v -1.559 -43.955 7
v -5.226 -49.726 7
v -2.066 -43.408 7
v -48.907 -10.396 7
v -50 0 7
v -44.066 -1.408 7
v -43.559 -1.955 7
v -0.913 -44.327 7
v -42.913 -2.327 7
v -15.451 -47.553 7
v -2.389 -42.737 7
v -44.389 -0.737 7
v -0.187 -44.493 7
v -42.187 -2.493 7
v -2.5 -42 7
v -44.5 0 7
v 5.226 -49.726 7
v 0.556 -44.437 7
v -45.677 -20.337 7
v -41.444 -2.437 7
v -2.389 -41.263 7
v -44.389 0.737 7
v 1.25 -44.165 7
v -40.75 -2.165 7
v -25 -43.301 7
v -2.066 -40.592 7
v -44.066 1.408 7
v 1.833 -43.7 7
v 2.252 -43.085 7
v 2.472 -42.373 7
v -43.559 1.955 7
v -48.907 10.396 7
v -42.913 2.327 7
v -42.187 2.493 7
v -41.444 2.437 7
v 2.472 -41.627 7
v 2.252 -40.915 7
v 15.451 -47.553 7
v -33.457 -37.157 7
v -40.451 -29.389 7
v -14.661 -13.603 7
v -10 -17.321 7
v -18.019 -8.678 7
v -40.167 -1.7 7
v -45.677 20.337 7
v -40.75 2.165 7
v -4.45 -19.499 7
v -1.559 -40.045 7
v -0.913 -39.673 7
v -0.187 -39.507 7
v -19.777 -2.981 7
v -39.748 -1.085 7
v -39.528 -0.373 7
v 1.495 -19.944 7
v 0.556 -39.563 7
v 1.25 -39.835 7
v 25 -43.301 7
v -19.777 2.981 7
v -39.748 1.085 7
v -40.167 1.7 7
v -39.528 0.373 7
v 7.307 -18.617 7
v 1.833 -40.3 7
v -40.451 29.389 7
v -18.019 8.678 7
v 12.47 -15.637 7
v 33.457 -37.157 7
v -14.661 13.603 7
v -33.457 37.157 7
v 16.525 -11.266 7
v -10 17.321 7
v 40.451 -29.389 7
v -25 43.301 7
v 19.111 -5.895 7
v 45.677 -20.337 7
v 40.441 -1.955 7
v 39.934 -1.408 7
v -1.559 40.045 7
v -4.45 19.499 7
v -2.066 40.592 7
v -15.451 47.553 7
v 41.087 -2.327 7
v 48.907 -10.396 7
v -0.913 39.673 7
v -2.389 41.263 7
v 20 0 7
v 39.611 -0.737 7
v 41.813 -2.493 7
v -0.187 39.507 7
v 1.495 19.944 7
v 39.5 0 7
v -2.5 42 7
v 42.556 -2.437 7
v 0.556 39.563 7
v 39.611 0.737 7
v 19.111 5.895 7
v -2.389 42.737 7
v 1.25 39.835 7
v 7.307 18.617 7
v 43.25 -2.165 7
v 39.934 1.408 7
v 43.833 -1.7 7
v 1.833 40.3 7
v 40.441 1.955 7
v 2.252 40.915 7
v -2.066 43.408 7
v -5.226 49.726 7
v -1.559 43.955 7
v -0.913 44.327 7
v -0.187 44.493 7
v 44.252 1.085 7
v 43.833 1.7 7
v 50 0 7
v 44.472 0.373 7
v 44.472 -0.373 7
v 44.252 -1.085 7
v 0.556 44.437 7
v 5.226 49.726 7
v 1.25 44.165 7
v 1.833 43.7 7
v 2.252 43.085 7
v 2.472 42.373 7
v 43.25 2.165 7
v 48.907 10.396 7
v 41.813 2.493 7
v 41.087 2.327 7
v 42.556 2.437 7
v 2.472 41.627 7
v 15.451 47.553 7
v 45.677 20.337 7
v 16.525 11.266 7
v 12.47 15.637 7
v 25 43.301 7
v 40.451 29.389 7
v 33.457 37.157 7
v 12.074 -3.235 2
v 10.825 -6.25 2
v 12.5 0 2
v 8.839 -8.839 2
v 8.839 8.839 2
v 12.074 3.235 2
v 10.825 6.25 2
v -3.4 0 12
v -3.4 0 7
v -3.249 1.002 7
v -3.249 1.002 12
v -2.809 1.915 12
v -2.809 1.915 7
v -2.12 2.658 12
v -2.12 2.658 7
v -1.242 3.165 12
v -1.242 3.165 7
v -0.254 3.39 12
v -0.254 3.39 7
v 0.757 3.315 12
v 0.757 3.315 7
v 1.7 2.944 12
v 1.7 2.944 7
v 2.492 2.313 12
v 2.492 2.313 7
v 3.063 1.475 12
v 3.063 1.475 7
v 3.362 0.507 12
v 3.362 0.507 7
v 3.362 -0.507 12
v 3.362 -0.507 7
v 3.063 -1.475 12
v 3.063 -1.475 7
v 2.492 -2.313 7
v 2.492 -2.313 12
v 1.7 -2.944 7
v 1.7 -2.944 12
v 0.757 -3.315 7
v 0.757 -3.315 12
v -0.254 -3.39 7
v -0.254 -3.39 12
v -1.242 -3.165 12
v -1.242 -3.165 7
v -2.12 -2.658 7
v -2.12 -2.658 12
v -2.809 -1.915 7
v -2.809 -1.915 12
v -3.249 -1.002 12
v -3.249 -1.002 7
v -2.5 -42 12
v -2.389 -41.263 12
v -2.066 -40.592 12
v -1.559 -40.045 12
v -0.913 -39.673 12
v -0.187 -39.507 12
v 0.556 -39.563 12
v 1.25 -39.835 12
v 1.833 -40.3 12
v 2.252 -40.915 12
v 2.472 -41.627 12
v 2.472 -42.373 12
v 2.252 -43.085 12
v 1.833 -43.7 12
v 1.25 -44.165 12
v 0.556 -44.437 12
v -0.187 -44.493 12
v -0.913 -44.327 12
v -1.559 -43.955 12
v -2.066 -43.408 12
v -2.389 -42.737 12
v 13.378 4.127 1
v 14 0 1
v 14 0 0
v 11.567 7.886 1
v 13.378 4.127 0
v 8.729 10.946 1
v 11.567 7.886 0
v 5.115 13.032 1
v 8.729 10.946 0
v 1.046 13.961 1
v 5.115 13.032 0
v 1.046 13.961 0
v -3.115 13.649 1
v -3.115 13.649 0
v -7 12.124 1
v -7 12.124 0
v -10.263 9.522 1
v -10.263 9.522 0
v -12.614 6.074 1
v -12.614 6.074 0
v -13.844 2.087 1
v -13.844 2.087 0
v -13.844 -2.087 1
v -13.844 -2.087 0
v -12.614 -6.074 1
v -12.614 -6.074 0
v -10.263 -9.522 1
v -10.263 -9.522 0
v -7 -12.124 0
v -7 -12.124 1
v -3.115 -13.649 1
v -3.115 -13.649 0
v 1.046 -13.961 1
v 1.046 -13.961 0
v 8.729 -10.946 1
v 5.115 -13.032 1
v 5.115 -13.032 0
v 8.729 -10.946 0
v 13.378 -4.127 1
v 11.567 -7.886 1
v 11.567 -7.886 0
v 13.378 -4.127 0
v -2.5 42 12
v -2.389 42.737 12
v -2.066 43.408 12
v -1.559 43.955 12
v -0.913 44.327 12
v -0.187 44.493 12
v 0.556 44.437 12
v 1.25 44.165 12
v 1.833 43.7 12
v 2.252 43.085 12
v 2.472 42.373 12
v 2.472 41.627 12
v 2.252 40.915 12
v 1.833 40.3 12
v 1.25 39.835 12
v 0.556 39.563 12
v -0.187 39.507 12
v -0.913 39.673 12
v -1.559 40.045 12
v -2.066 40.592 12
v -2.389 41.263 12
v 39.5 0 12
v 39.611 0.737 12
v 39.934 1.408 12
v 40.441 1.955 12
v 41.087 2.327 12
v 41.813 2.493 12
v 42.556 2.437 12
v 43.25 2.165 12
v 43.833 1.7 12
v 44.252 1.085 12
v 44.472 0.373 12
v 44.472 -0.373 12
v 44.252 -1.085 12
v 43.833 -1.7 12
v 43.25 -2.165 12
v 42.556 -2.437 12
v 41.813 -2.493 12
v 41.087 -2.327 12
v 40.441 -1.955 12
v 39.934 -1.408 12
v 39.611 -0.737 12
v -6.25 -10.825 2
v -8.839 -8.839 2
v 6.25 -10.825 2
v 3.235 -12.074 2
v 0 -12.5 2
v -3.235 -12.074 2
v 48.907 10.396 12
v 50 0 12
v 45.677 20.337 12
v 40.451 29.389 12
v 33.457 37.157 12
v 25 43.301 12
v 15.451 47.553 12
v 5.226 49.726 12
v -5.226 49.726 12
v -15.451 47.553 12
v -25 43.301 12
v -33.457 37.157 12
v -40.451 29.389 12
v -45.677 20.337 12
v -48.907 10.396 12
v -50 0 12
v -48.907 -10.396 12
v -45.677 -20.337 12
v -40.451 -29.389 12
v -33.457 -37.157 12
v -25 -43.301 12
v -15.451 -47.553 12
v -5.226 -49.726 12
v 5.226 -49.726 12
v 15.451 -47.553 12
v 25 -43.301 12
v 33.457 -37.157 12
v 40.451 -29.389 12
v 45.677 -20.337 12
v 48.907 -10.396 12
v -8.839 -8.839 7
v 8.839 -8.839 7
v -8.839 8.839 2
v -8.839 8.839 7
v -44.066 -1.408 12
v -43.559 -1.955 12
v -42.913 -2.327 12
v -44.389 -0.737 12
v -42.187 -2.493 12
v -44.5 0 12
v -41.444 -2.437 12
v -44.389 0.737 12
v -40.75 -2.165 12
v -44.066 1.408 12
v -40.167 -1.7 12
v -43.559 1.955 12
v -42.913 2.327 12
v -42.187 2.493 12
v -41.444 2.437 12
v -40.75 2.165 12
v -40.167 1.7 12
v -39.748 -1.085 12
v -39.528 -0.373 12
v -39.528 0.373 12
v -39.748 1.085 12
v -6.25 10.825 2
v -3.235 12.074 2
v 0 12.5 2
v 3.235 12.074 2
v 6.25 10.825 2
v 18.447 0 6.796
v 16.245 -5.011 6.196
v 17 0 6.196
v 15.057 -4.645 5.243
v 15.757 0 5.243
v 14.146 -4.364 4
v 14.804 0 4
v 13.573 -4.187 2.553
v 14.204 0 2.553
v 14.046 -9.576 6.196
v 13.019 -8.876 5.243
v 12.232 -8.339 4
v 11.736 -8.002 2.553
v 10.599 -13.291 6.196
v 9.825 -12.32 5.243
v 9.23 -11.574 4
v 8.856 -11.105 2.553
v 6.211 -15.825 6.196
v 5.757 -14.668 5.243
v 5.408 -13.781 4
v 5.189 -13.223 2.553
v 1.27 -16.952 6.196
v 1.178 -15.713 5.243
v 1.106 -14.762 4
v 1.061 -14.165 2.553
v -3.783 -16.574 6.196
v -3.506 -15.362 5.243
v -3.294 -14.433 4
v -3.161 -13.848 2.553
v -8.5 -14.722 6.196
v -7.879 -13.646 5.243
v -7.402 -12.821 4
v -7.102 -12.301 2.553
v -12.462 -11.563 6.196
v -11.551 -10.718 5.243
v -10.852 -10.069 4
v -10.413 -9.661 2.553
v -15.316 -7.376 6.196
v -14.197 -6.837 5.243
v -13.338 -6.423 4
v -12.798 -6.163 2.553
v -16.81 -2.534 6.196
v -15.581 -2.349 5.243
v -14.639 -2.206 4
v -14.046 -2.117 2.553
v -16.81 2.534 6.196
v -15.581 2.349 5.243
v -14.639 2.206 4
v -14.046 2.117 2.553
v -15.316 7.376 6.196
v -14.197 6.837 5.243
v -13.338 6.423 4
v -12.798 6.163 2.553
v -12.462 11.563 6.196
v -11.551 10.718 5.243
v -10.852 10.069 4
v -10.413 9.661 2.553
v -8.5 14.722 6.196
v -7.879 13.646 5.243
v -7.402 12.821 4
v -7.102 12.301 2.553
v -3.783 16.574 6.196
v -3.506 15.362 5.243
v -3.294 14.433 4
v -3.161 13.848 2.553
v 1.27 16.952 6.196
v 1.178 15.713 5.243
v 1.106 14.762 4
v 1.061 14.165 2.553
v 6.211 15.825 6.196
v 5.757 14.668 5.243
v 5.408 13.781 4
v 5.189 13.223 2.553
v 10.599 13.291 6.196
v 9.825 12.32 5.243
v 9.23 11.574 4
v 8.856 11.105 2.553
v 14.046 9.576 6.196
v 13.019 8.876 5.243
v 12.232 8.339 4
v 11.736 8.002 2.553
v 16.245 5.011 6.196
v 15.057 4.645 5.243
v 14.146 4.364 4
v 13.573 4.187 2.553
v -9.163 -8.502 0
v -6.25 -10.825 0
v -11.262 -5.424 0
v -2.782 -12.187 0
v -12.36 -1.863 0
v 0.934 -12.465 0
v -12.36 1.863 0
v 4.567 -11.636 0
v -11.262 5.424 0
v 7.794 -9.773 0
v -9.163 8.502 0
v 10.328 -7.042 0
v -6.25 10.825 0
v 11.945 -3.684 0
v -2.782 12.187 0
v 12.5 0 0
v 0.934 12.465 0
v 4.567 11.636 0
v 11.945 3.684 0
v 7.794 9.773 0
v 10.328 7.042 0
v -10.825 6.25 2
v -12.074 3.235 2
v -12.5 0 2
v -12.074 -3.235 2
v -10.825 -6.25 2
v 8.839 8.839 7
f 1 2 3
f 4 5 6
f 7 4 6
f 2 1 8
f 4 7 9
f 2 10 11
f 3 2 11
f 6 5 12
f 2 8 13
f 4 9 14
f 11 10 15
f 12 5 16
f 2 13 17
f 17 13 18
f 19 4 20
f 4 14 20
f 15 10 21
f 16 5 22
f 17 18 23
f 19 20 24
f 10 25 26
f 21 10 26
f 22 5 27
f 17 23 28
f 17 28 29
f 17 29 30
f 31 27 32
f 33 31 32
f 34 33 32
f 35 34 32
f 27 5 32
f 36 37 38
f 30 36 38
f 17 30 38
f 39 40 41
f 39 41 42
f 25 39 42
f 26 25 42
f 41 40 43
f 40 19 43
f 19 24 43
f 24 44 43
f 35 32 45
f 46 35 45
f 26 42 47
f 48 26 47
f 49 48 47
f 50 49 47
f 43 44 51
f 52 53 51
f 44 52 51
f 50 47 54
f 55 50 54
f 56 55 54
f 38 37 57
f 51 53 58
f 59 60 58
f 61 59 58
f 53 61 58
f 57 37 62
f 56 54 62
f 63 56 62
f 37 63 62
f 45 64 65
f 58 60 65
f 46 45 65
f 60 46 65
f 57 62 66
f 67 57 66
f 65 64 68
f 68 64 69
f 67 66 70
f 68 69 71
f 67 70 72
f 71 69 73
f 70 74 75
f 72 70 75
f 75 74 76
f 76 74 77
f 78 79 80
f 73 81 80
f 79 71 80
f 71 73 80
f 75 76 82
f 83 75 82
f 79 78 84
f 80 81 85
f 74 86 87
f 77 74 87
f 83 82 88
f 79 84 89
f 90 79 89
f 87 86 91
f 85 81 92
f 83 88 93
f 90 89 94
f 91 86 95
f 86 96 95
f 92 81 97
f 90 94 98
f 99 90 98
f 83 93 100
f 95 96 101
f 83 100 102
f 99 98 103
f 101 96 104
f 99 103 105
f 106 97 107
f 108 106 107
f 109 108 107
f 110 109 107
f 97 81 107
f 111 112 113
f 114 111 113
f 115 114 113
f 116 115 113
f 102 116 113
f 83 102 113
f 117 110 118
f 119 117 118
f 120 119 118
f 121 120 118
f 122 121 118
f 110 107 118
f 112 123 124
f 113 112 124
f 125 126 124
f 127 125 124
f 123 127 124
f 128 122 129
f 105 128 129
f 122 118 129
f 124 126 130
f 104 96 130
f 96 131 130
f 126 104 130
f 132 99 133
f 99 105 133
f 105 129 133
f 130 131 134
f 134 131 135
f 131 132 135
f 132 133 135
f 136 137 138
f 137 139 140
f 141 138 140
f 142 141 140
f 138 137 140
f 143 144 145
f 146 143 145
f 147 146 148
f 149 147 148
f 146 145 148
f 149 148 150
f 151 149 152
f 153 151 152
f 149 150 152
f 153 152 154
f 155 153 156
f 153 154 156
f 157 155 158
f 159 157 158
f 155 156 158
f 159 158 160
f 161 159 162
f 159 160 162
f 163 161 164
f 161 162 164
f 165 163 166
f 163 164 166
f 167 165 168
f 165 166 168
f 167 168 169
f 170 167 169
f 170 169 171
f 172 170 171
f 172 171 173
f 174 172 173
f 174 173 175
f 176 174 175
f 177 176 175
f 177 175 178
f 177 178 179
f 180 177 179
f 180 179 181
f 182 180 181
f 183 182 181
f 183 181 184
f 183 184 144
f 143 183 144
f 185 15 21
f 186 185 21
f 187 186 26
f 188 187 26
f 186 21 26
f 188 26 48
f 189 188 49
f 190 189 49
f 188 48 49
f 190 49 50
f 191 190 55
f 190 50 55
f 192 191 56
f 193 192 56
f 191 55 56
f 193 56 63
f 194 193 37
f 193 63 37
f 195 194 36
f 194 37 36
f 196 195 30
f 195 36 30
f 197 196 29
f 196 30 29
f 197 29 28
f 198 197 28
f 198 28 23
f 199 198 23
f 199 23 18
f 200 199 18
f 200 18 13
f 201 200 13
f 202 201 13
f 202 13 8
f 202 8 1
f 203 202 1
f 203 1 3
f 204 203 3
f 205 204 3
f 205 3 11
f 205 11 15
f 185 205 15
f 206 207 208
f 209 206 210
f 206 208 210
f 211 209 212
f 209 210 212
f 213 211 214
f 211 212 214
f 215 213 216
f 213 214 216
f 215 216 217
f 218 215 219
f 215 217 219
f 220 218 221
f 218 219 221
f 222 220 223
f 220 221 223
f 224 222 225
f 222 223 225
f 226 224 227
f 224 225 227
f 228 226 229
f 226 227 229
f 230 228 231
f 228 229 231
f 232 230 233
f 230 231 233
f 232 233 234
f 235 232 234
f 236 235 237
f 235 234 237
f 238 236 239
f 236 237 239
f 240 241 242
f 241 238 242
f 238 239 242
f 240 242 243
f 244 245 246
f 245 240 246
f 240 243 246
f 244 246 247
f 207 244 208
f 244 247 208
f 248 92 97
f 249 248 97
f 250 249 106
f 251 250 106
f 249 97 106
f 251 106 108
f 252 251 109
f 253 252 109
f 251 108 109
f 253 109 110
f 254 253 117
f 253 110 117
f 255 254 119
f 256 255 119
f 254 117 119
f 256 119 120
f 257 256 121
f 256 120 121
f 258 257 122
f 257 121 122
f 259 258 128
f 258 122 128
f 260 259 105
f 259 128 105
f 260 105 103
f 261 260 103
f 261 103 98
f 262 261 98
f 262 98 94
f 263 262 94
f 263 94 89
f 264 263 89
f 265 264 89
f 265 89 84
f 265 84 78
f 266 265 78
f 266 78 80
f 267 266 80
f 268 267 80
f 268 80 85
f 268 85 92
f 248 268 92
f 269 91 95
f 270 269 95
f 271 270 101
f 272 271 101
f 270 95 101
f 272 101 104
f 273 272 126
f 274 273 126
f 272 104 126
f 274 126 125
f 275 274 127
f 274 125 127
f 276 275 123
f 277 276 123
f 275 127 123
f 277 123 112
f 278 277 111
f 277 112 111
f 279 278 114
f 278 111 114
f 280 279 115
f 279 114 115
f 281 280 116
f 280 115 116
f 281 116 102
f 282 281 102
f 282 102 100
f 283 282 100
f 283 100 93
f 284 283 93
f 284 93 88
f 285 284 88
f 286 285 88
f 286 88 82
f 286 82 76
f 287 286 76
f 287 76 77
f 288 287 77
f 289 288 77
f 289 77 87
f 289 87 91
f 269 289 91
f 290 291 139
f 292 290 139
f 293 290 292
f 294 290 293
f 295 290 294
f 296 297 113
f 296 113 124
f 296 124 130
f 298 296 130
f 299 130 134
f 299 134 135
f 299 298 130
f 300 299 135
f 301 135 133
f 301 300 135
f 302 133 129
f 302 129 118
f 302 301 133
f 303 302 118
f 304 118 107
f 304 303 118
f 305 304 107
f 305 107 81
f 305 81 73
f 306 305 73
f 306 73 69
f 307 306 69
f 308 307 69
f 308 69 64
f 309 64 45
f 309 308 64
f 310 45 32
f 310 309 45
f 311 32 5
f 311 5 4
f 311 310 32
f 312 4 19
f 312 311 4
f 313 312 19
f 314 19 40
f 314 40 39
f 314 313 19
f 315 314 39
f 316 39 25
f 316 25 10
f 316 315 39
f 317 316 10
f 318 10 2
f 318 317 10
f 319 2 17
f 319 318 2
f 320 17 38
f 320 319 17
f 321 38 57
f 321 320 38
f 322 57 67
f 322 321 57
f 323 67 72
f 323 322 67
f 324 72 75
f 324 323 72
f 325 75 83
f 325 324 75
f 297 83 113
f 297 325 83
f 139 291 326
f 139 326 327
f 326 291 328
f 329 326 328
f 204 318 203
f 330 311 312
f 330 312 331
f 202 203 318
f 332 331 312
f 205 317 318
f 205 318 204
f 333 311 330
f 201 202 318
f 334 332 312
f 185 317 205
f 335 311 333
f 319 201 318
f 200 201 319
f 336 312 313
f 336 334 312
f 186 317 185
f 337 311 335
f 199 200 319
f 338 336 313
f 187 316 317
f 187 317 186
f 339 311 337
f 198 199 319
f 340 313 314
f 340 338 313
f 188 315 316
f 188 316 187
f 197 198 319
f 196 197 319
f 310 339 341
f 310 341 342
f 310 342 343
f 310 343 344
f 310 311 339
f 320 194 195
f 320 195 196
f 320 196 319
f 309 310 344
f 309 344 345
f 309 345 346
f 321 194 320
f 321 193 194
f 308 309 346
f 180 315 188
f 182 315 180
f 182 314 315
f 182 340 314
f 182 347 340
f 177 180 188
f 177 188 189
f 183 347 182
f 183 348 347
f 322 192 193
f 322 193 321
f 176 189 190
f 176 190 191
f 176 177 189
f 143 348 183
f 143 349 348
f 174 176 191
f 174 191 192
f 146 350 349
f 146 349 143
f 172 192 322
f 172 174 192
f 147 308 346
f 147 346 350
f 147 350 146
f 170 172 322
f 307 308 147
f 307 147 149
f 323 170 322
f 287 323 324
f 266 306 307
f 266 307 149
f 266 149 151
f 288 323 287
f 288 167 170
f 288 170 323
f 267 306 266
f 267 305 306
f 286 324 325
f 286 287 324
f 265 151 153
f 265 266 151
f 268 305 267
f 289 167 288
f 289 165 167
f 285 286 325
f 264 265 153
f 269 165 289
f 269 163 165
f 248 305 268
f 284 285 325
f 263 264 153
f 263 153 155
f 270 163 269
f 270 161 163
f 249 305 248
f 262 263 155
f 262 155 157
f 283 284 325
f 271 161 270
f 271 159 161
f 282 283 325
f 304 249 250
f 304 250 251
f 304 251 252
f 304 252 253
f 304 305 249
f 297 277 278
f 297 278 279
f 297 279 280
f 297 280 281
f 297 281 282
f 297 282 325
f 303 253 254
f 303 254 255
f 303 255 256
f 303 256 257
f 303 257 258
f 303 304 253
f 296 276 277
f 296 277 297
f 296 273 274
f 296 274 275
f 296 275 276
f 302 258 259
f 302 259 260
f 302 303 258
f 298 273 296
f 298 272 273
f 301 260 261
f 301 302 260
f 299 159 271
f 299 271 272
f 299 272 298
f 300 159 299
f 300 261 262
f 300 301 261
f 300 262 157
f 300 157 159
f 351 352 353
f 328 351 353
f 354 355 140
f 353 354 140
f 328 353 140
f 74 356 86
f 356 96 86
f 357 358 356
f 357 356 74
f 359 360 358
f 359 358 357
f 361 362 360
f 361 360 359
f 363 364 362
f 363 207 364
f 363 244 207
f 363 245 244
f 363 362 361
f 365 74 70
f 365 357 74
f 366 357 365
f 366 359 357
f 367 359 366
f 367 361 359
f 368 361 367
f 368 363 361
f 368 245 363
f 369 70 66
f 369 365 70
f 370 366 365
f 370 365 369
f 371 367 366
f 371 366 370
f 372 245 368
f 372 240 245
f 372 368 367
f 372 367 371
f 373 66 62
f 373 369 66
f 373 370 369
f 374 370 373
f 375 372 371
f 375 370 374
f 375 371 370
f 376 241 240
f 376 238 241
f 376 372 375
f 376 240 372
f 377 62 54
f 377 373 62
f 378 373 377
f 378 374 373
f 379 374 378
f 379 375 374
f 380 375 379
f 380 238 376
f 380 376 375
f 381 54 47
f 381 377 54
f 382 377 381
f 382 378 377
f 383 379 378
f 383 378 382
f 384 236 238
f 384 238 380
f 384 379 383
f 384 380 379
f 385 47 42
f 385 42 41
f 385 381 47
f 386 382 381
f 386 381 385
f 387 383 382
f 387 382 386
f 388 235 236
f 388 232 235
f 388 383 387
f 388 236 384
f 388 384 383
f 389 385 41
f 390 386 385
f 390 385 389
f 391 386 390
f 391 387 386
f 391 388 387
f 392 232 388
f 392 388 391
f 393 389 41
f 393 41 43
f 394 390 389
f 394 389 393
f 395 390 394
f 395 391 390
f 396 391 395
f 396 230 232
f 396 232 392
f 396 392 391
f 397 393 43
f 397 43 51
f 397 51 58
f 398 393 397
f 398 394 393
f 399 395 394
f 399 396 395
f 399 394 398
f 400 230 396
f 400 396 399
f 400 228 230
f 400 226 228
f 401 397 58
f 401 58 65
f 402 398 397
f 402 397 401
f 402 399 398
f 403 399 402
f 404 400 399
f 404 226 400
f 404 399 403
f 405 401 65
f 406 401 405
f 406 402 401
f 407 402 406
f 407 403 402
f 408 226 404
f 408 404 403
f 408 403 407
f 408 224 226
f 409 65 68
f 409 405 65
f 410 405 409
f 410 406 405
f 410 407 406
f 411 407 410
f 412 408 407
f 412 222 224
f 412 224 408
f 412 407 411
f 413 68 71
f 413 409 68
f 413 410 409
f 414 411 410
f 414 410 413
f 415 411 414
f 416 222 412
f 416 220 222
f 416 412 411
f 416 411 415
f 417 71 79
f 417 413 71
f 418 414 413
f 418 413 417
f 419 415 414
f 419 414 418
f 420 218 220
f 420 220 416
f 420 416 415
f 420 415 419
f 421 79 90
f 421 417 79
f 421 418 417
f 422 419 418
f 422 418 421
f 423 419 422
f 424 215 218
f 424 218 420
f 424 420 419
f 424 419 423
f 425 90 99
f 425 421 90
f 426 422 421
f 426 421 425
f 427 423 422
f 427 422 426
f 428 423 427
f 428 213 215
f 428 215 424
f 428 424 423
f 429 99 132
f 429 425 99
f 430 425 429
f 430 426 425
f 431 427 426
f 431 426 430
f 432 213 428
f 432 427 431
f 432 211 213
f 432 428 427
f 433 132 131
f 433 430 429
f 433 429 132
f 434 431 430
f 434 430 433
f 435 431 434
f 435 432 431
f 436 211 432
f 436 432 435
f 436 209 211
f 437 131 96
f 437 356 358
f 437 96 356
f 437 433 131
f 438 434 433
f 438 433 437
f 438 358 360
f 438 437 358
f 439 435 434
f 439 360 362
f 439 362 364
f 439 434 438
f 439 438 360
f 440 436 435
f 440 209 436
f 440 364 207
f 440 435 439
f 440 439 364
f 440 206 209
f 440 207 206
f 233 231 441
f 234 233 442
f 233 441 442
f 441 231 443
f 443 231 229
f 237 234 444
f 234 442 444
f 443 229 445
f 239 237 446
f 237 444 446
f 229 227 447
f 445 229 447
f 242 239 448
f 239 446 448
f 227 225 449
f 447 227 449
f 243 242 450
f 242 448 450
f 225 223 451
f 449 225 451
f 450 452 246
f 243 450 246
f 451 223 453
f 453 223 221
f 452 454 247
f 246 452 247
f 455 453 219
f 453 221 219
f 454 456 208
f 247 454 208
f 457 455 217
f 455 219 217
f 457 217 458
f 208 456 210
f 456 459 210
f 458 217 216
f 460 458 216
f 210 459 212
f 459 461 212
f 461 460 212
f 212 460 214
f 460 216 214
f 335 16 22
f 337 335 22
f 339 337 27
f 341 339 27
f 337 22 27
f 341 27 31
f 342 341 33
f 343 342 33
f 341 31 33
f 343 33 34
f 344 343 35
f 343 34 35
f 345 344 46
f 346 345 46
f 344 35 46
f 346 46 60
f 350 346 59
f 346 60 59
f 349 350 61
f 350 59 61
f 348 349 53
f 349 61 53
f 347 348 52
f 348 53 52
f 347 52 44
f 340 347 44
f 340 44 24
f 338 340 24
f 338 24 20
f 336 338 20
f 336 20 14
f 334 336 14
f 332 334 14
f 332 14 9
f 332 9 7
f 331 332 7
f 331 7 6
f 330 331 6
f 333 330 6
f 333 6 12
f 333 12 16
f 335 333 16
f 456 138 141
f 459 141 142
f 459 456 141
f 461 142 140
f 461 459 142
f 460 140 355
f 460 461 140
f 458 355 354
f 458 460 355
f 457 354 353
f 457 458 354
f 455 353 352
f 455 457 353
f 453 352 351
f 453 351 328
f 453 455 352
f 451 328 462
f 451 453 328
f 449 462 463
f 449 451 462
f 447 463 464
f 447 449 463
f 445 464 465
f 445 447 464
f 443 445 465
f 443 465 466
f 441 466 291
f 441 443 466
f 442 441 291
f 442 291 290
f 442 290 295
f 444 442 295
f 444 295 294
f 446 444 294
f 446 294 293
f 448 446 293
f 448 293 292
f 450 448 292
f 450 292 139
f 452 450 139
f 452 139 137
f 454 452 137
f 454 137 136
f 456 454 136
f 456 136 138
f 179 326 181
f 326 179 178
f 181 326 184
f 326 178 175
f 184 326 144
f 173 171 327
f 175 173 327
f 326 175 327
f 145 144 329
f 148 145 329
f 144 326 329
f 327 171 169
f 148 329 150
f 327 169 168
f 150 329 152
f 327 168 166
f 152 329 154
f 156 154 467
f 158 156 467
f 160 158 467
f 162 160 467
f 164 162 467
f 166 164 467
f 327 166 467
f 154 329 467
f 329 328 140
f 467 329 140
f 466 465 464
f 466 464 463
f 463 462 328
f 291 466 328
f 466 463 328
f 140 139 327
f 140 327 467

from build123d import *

# Parameters (mm, degrees)
SKETCH1_R              = 14
SKETCH1_R_2            = 12.5
BOSS_EXTRUDE1_DEPTH    = 2
SKETCH2_R              = 14
SKETCH2_W              = 17.67766953
SKETCH2_H              = 17.67766953
BOSS_EXTRUDE2_DEPTH    = 5
SKETCH3_R              = 14
BOSS_EXTRUDE3_DEPTH    = 5
SKETCH6_R              = 50
BOSS_EXTRUDE4_DEPTH    = 5
M8X1_25_TAPPED_HOLE1_D = 6.8
M6X1_0_TAPPED_HOLE1_D  = 5
FILLET1_R              = 6


with BuildPart() as part:
    # Sketch1 → Boss-Extrude1 (new body)
    with BuildSketch(Plane.XY):
        Circle(SKETCH1_R)
        Circle(SKETCH1_R_2, mode=Mode.SUBTRACT)
    extrude(amount=BOSS_EXTRUDE1_DEPTH)

    # Sketch2 → Boss-Extrude2 (add)
    with BuildSketch(Plane.XY.offset(2)):
        Circle(SKETCH2_R)
        Rectangle(SKETCH2_W, SKETCH2_H, mode=Mode.SUBTRACT)
    extrude(amount=BOSS_EXTRUDE2_DEPTH)

    # Sketch3 → Boss-Extrude3 (add)
    with BuildSketch(Plane.XY.offset(7)):
        Circle(SKETCH3_R)
    extrude(amount=BOSS_EXTRUDE3_DEPTH)

    # Sketch6 → Boss-Extrude4 (add)
    with BuildSketch(Plane.XY.offset(12)):
        Circle(SKETCH6_R)
    extrude(amount=-BOSS_EXTRUDE4_DEPTH)

    # M8x1.25 Tapped Hole1 (through all)
    with Locations(Plane.XY.offset(12)):
        with Locations((0, 0)):
            Hole(M8X1_25_TAPPED_HOLE1_D / 2)

    # M6x1.0 Tapped Hole1 (through all)
    with Locations(Plane.XY.offset(12)):
        with Locations((0, 42), (42, 0), (0, -42), (-42, 0)):
            Hole(M6X1_0_TAPPED_HOLE1_D / 2)

    # Fillet1
    fillet1_edges = [part.edges().sort_by_distance(p)[0] for p in [
        (-14, 0, 7),
    ]]
    fillet(fillet1_edges, radius=FILLET1_R)


solid = part.part
